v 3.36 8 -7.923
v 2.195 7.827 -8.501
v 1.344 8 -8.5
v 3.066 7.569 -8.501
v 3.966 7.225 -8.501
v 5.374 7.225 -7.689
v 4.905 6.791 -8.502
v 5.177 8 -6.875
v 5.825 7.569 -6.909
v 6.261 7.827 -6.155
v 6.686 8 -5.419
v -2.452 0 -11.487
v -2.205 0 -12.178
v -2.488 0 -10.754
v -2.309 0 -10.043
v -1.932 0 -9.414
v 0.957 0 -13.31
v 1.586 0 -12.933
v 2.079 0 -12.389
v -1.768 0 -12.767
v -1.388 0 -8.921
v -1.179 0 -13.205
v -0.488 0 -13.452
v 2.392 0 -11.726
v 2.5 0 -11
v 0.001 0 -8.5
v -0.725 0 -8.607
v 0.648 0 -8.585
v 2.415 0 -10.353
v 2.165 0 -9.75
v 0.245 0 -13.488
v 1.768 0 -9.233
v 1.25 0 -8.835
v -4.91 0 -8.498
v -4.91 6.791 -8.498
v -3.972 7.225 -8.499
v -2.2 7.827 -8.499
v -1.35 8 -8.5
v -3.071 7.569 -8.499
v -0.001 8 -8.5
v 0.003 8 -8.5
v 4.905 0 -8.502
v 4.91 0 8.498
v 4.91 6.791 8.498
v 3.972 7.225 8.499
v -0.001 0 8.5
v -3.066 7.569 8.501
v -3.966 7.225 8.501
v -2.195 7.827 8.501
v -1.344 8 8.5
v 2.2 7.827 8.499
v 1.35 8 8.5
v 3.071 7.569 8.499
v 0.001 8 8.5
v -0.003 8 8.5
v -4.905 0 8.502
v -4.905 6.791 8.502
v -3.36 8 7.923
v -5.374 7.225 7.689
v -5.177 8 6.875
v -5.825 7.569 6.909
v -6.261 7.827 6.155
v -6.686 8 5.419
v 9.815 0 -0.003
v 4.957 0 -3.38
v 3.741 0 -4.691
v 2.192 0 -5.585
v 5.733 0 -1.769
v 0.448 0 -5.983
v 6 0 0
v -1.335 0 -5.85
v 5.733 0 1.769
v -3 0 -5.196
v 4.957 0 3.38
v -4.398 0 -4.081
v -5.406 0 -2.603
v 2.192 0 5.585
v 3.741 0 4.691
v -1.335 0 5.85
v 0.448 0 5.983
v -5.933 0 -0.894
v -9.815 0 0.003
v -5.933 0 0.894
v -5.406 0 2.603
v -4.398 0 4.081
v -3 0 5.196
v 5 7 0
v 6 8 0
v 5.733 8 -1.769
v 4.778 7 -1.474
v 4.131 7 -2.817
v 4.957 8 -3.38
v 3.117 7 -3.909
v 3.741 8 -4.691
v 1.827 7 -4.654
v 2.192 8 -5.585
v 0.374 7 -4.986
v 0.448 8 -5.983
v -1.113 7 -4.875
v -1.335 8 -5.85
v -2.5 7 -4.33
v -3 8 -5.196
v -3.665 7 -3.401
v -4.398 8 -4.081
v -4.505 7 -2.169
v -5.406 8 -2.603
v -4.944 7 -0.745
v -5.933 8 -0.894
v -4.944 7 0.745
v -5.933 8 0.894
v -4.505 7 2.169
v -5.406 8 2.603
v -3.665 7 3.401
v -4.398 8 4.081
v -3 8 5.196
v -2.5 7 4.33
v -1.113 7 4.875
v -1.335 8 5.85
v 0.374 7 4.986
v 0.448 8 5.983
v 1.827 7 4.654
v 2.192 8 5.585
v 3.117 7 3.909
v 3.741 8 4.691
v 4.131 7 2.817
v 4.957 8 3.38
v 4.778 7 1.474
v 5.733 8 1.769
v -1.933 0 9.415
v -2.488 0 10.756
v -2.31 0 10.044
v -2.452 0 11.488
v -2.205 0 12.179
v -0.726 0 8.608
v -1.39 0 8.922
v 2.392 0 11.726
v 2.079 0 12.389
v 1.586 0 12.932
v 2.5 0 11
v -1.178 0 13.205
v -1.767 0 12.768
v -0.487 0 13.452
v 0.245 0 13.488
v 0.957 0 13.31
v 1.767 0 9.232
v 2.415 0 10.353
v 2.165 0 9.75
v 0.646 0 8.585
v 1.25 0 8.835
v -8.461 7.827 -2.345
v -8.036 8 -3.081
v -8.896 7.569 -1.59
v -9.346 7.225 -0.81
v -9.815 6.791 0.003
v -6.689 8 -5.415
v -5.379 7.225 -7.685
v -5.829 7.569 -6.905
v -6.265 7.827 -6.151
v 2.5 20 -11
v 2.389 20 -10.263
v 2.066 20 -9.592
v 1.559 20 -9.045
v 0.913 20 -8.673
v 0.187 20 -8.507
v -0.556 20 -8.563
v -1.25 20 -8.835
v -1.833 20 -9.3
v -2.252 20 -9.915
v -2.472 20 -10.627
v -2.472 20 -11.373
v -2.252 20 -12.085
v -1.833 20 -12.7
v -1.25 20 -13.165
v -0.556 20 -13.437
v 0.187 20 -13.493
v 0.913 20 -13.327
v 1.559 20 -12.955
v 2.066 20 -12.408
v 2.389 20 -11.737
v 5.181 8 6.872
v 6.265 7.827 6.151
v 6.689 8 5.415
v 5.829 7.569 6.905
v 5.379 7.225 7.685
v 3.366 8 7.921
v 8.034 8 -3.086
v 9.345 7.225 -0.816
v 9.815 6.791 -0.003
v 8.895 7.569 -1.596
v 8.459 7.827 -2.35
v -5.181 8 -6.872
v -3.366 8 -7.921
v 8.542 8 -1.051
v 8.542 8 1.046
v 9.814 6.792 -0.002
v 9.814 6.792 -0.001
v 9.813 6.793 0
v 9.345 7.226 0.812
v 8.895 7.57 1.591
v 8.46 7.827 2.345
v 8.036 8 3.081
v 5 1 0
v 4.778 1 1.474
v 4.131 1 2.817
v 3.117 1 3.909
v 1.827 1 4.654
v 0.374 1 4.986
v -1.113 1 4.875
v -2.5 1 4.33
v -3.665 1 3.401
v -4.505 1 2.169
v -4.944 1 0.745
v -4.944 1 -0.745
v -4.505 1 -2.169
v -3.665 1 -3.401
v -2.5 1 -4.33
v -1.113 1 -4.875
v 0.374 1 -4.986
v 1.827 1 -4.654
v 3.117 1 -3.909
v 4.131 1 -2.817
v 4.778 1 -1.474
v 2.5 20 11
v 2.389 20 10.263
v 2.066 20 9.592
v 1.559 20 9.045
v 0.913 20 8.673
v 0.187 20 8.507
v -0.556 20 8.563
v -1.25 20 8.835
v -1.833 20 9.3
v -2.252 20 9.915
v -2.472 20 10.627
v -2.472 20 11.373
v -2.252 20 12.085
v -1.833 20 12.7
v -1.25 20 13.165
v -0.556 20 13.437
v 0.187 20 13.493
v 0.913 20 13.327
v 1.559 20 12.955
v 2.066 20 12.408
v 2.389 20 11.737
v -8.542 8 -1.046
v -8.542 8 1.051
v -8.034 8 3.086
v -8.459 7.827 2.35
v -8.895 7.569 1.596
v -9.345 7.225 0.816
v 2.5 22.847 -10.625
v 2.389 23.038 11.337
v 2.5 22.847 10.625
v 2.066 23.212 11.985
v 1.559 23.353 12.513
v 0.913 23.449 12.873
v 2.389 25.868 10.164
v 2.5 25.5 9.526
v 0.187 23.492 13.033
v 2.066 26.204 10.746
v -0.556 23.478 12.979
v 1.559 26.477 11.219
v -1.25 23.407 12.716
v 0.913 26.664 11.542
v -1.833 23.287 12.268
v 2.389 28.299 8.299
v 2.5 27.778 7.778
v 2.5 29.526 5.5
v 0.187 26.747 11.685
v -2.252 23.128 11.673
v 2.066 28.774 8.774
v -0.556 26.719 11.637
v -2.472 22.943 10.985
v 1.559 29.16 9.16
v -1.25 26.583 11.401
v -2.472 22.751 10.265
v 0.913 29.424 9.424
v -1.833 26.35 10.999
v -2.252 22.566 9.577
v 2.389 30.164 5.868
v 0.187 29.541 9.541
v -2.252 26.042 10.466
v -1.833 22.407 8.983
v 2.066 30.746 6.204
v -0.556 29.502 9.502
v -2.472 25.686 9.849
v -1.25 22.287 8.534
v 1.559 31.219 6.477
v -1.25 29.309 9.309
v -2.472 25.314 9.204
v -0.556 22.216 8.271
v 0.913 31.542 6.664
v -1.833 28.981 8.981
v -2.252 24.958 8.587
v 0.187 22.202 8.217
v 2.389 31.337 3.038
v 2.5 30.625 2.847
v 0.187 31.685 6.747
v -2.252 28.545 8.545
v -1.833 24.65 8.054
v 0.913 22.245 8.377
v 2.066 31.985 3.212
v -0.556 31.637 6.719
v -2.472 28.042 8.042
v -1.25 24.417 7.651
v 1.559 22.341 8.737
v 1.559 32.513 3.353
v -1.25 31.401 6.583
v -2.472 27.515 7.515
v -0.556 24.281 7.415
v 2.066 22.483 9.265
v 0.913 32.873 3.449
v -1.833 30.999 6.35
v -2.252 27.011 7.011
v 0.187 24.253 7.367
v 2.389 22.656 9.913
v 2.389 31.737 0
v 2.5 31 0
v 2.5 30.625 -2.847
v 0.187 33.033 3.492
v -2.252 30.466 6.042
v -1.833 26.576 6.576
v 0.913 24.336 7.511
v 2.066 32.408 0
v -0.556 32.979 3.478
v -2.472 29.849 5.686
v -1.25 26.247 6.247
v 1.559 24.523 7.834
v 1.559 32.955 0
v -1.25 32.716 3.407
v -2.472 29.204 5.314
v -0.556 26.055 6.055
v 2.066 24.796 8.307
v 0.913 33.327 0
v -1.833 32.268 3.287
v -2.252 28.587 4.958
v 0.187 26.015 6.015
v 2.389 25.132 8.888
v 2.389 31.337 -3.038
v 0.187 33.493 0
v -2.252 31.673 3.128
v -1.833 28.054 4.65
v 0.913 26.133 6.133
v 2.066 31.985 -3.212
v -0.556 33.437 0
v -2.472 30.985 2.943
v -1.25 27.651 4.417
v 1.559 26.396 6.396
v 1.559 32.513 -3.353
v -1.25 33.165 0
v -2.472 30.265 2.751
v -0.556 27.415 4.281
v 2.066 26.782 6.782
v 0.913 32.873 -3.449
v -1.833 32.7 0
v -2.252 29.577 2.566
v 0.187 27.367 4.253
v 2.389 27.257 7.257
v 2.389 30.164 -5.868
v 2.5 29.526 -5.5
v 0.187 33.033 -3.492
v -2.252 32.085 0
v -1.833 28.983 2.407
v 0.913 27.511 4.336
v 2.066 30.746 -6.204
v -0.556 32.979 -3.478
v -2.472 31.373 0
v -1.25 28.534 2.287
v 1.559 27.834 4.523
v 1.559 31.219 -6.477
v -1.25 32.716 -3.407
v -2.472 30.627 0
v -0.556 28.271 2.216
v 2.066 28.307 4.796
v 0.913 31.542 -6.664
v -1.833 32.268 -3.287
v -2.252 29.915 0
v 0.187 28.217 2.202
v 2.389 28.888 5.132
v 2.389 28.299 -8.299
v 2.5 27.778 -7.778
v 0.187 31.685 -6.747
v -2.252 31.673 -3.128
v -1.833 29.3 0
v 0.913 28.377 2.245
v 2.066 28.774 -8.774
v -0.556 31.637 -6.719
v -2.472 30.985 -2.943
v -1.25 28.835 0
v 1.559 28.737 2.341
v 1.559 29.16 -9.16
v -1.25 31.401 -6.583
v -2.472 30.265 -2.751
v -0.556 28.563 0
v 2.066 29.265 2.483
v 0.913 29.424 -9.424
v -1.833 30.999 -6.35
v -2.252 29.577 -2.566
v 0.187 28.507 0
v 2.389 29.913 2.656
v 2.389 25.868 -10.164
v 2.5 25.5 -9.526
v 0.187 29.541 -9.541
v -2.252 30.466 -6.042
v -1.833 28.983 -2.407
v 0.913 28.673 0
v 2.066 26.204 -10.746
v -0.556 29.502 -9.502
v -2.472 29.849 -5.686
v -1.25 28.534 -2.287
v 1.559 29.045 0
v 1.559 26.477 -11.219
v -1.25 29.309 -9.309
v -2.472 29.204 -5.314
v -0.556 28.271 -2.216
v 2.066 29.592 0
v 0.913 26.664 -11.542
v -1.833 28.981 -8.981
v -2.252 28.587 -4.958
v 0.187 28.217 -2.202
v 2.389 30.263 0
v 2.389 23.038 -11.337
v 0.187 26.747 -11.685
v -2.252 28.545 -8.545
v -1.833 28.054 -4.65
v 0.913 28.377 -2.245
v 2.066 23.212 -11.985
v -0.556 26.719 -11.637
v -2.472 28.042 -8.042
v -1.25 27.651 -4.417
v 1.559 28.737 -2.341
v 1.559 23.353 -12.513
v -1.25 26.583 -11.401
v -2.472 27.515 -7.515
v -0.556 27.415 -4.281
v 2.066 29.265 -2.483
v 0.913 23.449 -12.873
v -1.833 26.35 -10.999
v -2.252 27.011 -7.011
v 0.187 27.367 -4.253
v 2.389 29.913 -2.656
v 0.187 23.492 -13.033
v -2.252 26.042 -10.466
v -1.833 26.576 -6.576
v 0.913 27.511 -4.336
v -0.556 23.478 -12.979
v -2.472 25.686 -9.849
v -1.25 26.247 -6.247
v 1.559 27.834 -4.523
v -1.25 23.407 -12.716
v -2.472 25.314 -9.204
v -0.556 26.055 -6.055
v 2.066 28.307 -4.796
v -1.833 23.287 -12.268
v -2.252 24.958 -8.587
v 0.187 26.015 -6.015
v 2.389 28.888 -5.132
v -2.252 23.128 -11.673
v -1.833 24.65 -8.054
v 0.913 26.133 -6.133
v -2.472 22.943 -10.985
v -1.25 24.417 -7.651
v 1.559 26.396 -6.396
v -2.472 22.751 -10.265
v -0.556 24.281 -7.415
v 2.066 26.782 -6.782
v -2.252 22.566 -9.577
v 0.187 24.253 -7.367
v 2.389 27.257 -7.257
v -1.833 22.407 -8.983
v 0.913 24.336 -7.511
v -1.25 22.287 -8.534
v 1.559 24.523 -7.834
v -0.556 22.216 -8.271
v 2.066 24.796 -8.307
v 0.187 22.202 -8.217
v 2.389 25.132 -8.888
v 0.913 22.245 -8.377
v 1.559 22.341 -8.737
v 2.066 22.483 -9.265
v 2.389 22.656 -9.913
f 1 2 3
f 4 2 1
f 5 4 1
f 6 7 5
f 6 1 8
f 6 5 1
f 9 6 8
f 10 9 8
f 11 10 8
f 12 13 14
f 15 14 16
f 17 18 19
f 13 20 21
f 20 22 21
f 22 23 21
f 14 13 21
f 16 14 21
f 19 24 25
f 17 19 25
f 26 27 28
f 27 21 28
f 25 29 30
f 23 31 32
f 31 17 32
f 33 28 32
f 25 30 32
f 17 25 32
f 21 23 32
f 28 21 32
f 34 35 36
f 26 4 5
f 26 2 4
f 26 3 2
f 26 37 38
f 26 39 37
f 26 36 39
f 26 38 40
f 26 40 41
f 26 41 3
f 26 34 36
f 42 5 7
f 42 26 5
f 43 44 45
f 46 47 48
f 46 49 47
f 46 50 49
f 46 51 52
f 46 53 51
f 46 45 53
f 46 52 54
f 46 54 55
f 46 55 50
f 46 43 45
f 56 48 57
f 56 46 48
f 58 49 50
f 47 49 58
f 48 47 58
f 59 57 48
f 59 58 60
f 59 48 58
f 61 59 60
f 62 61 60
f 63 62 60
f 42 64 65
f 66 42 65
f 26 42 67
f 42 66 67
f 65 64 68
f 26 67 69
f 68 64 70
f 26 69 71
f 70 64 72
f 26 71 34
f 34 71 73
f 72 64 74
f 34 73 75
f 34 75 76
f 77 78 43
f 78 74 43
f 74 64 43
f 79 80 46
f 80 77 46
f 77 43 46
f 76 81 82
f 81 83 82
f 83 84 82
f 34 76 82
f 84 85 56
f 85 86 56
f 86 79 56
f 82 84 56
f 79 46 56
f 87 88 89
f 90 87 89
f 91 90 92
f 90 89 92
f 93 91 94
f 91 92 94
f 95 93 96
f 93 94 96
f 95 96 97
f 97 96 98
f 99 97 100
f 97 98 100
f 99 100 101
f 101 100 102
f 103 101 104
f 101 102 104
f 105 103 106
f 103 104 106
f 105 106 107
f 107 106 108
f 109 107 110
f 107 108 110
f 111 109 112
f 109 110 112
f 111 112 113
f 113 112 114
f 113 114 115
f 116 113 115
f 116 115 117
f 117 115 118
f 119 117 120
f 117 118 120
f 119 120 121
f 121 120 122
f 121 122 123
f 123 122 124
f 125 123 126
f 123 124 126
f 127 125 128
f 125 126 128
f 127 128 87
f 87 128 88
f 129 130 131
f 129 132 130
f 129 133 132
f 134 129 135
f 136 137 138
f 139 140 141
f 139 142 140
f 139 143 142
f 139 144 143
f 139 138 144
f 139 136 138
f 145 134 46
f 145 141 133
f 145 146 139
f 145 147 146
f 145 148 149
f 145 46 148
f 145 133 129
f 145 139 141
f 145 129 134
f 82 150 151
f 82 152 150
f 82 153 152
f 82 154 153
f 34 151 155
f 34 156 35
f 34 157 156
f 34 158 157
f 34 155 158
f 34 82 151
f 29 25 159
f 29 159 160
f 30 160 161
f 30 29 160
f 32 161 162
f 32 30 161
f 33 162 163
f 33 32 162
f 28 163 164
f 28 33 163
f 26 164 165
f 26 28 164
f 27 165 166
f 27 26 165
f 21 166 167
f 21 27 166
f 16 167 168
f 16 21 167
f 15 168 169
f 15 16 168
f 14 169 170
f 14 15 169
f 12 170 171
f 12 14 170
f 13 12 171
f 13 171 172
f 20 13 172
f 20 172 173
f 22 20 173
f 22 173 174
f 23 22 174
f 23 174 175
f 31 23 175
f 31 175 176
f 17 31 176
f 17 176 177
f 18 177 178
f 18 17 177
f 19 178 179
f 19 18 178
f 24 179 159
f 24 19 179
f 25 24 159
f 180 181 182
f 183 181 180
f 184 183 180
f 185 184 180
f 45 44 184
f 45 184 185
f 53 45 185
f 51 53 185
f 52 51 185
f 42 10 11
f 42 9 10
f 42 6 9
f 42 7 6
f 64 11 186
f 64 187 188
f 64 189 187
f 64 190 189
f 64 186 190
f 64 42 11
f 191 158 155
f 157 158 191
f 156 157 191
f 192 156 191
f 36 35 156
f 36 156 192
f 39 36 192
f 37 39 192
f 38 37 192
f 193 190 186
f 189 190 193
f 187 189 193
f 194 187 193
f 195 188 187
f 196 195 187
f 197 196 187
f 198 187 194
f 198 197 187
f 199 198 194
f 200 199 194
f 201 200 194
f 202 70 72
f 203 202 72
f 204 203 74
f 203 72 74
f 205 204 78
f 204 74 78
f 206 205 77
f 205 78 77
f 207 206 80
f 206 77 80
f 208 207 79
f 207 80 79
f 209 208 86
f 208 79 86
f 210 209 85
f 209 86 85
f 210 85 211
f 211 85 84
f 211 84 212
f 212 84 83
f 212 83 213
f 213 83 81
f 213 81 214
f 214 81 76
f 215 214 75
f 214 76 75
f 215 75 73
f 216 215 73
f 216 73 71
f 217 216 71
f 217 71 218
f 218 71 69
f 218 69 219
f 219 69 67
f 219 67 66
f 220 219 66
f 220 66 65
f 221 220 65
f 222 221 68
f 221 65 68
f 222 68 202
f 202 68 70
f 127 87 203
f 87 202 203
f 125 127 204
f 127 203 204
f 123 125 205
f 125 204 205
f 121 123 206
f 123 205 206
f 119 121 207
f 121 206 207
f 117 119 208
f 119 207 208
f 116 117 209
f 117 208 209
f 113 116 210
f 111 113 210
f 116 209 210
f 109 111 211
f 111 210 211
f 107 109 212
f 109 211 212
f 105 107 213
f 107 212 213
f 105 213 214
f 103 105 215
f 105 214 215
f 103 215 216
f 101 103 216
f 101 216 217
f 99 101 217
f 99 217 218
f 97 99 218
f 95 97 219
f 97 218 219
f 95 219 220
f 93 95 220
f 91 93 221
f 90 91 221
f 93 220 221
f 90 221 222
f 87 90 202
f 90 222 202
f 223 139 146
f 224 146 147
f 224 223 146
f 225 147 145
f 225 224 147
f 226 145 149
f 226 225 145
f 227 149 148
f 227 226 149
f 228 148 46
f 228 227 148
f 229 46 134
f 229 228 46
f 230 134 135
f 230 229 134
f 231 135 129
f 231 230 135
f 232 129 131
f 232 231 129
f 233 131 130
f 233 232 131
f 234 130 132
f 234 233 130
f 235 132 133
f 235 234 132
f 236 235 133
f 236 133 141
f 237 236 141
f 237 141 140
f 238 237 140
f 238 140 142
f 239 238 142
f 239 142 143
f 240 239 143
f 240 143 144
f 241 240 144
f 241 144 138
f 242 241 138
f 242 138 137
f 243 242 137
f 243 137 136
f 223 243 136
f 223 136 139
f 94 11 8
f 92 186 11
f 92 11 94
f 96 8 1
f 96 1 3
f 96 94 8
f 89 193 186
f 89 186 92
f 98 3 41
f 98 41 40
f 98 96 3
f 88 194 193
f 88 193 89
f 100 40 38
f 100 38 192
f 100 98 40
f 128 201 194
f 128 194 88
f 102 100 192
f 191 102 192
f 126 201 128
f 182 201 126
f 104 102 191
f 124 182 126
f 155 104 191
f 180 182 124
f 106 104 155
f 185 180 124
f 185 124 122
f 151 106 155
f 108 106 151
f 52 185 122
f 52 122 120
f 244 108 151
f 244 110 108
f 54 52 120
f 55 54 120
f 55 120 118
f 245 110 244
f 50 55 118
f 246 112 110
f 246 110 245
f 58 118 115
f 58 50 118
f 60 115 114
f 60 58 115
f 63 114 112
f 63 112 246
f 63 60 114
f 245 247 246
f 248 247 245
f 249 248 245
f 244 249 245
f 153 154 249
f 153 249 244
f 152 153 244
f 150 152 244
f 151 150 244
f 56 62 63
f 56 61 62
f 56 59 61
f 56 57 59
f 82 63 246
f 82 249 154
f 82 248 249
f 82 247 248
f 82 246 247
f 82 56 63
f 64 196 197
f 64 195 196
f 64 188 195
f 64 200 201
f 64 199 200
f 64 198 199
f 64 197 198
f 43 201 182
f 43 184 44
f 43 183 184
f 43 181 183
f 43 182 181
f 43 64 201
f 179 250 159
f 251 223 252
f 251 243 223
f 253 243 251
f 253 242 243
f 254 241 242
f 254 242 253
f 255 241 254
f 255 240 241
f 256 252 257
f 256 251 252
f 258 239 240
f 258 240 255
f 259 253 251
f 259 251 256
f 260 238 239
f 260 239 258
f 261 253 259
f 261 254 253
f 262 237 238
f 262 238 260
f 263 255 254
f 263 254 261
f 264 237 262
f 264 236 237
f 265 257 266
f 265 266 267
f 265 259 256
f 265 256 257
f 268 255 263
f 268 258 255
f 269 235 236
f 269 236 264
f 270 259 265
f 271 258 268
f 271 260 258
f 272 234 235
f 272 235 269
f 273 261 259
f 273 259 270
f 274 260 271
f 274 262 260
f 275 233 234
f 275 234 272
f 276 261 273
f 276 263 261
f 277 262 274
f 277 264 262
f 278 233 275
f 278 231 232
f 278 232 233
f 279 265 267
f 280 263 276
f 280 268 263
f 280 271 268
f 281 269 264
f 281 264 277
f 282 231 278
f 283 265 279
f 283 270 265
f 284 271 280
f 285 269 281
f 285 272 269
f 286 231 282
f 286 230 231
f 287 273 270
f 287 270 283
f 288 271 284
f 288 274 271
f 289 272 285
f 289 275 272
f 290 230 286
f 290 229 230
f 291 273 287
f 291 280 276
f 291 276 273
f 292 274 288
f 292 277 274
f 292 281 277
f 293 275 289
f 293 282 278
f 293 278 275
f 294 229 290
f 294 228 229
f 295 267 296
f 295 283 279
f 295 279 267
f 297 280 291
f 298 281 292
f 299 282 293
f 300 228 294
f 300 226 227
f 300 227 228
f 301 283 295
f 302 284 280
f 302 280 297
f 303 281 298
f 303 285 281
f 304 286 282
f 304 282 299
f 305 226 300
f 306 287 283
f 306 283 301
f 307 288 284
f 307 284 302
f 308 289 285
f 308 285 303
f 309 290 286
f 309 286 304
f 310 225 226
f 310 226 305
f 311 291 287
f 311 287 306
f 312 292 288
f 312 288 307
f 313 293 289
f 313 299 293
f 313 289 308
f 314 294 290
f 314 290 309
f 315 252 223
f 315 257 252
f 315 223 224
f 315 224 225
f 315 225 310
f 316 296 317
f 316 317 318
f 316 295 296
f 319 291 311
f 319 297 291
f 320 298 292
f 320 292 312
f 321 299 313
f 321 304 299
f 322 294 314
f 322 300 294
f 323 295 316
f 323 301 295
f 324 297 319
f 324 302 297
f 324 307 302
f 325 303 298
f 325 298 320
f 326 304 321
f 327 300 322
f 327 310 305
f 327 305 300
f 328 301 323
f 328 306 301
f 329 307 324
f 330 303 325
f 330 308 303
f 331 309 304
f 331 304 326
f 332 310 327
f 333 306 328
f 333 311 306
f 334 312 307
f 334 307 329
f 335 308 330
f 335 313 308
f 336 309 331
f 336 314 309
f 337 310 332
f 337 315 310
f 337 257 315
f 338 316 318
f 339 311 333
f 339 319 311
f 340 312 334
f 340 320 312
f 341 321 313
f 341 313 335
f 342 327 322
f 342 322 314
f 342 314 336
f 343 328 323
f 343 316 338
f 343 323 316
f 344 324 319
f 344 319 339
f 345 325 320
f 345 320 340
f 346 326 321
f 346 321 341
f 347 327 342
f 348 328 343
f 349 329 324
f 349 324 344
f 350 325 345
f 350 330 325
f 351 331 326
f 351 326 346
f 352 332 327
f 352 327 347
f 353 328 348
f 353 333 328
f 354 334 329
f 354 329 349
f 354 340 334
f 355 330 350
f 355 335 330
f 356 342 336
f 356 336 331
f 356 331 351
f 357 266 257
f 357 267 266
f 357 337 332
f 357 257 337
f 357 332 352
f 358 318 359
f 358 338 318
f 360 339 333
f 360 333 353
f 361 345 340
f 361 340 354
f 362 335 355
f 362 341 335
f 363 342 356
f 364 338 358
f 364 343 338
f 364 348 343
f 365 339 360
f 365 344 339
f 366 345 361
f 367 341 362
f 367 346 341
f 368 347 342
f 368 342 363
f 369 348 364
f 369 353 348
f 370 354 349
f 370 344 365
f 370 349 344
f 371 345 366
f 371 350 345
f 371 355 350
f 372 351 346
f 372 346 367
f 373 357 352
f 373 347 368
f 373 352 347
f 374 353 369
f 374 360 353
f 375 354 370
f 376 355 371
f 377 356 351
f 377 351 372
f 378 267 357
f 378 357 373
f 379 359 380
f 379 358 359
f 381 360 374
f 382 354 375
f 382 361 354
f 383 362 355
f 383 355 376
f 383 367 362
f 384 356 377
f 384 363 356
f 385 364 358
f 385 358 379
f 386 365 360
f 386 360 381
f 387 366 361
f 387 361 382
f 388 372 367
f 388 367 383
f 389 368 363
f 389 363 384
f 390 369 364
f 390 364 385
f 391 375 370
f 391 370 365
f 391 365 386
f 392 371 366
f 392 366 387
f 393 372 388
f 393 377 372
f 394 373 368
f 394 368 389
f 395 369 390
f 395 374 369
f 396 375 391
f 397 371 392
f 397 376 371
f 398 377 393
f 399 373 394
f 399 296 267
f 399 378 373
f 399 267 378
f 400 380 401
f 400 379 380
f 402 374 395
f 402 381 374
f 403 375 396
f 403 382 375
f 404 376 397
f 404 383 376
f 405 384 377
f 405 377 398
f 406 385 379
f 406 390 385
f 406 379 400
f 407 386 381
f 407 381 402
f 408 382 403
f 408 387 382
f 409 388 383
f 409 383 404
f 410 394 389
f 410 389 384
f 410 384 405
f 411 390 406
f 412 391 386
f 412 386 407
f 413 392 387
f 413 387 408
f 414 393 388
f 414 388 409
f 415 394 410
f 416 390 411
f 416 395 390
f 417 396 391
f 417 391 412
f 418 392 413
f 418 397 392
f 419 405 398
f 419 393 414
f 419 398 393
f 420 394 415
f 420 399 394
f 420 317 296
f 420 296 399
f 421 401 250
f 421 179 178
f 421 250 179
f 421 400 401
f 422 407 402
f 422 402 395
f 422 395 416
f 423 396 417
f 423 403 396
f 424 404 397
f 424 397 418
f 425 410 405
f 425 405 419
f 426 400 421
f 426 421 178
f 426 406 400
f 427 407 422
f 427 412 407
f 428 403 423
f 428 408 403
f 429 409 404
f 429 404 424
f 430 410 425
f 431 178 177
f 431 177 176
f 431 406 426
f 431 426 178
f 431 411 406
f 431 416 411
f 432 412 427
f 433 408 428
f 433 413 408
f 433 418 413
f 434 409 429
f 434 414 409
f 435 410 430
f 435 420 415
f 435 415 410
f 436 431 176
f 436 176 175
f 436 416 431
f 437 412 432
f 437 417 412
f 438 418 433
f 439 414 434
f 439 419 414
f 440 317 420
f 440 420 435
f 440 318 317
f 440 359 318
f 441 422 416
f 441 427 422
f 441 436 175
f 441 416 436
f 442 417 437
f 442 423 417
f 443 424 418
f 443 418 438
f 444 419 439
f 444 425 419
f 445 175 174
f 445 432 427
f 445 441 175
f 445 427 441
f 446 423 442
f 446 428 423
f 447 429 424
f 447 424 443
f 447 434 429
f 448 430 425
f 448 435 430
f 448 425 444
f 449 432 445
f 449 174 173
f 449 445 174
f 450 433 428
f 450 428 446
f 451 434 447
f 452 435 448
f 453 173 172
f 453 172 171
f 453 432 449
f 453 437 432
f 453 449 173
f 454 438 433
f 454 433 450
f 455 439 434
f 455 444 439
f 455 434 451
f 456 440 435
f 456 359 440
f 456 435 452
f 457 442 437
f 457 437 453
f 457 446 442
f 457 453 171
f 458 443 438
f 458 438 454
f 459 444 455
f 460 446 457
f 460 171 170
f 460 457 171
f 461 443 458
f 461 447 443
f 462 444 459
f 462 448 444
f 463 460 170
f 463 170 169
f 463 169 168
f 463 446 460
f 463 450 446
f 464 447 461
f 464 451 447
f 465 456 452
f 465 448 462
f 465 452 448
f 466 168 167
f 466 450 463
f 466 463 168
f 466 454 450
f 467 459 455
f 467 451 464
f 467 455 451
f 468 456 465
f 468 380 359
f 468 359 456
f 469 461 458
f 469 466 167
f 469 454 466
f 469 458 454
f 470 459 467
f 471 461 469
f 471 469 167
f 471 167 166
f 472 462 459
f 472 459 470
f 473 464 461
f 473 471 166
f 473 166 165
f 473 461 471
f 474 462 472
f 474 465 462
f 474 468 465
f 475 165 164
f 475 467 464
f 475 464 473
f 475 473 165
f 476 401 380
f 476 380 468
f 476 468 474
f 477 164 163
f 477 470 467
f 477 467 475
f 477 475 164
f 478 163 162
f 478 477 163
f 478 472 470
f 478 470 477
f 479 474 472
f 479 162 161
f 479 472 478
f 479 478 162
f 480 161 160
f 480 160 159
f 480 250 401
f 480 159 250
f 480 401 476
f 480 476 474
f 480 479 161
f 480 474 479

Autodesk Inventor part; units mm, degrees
ref_plane "YZ Plane" through (0, 0, 0) normal (1, 0, 0) x (0, 1, 0)
ref_plane "XZ Plane" through (0, 0, 0) normal (0, 1, 0) x (-1, 0, 0)
ref_plane "XY Plane" through (0, 0, 0) normal (0, 0, 1) x (1, 0, 0)
sketch "Sketch3" plane through (0, 0, 0) normal (0, 1, 0) x (-1, 0, 0)
  line L0 (-4.9048, -8.5016) -> (-9.815, -0.0031)
  line L1 (-9.815, -0.0031) -> (-4.9102, 8.4984)
  line L2 (-4.9102, 8.4984) -> (4.9048, 8.5016)
  line L3 (4.9048, 8.5016) -> (9.815, 0.0031)
  line L4 (9.815, 0.0031) -> (4.9102, -8.4984)
  line L5 (4.9102, -8.4984) -> (-4.9048, -8.5016)
  point P0 (0, 0)
  point P1 (0, 0)
  dimension "d1" = 17
extrude "Extrusion1" add sketch "Sketch3" along normal blind 8
sketch "Sketch4" plane through (0, 8, 0) normal (0, 1, 0) x (1, 0, 0)
  circle A0 centre (0, 0) radius 8.6061
extrude "Extrusion2" cut sketch "Sketch4" against normal through all draft 45 keep common part
sketch "Sketch5" plane through (0, 0, 0) normal (0, -1, 0) x (1, 0, 0)
  circle A0 centre (0, 0) radius 5
  dimension "d6" = 10
extrude "Extrusion3" add sketch "Sketch5" along normal blind 40
sketch "Sketch6" plane through (0, 0, 0) normal (1, 0, 0) x (0, 1, 0)
  line L0 (-42, 5) -> (-43.5, 5)
  line L1 (-40, 5) -> (-40, -5) projected
  line L2 (-43.5, 5) -> (-42.9232, 4.001)
  line L3 (-43.5, 5) -> (-41.3699, 5) construction
  line L4 (-42, 5) -> (-42.5768, 4.001)
  line L5 (-42, 5) -> (-39, 5) construction
  arc A0 (-42.9232, 4.001) -> (-42.5768, 4.001) centre (-42.75, 4.101) ccw
  point P0 (0, 0)
  dimension "d10" = 1.5
  dimension "d11" = 2
  dimension "d12" = 60
  dimension "d13" = 120
  dimension "d14" = 0.2
coil "Coil2" sketch "Sketch6" operation cut axis through (0, -10, 0) along (0, 1, 0) pitch 1.7 turns 24.705882 hand right
sketch "Sketch18" plane through (0, 0, 0) normal (1, 0, 0) x (0, 1, 0)
  line L0 (0, 11) -> (20, 11)
  line L1 (0, -11) -> (20, -11) construction
  line L2 (0, -0.0031) -> (6.7911, -0.0031) projected
  arc A0 (20, -11) -> (20, 11) centre (20, 0) ccw
  line L3 (20, -11) -> (0, -11)
  line L4 (0, -0.0031) -> (0, 8.4984) projected
  point P0 (0, 0)
  dimension "d92" = 20
  dimension "d95" = 11.0031
  dimension "d97" = 11
  dimension "d101" = 20
  dimension "d102" = 0
sketch "Sketch19" plane through (0, 0, 0) normal (0, -1, 0) x (1, 0, 0)
  circle A0 centre (0, 11) radius 2.5
  point P0 (0, 0)
  dimension "d98" = 5
sweep "Sweep1" add profiles "Sketch19" path "Sketch18" path curves L0 A0 L3
sketch "Sketch20" plane through (0, -40, 0) normal (0, -1, 0) x (1, 0, 0)
  circle A0 centre (0, 0) radius 5
  dimension "d103" = 10
extrude "Extrusion11" cut sketch "Sketch20" against normal blind 50
chamfer "Chamfer2" distance 1 angle 45 2 edges at (-5, 8, 0) (-5, 0, 0)
properties part number "Bolt"
